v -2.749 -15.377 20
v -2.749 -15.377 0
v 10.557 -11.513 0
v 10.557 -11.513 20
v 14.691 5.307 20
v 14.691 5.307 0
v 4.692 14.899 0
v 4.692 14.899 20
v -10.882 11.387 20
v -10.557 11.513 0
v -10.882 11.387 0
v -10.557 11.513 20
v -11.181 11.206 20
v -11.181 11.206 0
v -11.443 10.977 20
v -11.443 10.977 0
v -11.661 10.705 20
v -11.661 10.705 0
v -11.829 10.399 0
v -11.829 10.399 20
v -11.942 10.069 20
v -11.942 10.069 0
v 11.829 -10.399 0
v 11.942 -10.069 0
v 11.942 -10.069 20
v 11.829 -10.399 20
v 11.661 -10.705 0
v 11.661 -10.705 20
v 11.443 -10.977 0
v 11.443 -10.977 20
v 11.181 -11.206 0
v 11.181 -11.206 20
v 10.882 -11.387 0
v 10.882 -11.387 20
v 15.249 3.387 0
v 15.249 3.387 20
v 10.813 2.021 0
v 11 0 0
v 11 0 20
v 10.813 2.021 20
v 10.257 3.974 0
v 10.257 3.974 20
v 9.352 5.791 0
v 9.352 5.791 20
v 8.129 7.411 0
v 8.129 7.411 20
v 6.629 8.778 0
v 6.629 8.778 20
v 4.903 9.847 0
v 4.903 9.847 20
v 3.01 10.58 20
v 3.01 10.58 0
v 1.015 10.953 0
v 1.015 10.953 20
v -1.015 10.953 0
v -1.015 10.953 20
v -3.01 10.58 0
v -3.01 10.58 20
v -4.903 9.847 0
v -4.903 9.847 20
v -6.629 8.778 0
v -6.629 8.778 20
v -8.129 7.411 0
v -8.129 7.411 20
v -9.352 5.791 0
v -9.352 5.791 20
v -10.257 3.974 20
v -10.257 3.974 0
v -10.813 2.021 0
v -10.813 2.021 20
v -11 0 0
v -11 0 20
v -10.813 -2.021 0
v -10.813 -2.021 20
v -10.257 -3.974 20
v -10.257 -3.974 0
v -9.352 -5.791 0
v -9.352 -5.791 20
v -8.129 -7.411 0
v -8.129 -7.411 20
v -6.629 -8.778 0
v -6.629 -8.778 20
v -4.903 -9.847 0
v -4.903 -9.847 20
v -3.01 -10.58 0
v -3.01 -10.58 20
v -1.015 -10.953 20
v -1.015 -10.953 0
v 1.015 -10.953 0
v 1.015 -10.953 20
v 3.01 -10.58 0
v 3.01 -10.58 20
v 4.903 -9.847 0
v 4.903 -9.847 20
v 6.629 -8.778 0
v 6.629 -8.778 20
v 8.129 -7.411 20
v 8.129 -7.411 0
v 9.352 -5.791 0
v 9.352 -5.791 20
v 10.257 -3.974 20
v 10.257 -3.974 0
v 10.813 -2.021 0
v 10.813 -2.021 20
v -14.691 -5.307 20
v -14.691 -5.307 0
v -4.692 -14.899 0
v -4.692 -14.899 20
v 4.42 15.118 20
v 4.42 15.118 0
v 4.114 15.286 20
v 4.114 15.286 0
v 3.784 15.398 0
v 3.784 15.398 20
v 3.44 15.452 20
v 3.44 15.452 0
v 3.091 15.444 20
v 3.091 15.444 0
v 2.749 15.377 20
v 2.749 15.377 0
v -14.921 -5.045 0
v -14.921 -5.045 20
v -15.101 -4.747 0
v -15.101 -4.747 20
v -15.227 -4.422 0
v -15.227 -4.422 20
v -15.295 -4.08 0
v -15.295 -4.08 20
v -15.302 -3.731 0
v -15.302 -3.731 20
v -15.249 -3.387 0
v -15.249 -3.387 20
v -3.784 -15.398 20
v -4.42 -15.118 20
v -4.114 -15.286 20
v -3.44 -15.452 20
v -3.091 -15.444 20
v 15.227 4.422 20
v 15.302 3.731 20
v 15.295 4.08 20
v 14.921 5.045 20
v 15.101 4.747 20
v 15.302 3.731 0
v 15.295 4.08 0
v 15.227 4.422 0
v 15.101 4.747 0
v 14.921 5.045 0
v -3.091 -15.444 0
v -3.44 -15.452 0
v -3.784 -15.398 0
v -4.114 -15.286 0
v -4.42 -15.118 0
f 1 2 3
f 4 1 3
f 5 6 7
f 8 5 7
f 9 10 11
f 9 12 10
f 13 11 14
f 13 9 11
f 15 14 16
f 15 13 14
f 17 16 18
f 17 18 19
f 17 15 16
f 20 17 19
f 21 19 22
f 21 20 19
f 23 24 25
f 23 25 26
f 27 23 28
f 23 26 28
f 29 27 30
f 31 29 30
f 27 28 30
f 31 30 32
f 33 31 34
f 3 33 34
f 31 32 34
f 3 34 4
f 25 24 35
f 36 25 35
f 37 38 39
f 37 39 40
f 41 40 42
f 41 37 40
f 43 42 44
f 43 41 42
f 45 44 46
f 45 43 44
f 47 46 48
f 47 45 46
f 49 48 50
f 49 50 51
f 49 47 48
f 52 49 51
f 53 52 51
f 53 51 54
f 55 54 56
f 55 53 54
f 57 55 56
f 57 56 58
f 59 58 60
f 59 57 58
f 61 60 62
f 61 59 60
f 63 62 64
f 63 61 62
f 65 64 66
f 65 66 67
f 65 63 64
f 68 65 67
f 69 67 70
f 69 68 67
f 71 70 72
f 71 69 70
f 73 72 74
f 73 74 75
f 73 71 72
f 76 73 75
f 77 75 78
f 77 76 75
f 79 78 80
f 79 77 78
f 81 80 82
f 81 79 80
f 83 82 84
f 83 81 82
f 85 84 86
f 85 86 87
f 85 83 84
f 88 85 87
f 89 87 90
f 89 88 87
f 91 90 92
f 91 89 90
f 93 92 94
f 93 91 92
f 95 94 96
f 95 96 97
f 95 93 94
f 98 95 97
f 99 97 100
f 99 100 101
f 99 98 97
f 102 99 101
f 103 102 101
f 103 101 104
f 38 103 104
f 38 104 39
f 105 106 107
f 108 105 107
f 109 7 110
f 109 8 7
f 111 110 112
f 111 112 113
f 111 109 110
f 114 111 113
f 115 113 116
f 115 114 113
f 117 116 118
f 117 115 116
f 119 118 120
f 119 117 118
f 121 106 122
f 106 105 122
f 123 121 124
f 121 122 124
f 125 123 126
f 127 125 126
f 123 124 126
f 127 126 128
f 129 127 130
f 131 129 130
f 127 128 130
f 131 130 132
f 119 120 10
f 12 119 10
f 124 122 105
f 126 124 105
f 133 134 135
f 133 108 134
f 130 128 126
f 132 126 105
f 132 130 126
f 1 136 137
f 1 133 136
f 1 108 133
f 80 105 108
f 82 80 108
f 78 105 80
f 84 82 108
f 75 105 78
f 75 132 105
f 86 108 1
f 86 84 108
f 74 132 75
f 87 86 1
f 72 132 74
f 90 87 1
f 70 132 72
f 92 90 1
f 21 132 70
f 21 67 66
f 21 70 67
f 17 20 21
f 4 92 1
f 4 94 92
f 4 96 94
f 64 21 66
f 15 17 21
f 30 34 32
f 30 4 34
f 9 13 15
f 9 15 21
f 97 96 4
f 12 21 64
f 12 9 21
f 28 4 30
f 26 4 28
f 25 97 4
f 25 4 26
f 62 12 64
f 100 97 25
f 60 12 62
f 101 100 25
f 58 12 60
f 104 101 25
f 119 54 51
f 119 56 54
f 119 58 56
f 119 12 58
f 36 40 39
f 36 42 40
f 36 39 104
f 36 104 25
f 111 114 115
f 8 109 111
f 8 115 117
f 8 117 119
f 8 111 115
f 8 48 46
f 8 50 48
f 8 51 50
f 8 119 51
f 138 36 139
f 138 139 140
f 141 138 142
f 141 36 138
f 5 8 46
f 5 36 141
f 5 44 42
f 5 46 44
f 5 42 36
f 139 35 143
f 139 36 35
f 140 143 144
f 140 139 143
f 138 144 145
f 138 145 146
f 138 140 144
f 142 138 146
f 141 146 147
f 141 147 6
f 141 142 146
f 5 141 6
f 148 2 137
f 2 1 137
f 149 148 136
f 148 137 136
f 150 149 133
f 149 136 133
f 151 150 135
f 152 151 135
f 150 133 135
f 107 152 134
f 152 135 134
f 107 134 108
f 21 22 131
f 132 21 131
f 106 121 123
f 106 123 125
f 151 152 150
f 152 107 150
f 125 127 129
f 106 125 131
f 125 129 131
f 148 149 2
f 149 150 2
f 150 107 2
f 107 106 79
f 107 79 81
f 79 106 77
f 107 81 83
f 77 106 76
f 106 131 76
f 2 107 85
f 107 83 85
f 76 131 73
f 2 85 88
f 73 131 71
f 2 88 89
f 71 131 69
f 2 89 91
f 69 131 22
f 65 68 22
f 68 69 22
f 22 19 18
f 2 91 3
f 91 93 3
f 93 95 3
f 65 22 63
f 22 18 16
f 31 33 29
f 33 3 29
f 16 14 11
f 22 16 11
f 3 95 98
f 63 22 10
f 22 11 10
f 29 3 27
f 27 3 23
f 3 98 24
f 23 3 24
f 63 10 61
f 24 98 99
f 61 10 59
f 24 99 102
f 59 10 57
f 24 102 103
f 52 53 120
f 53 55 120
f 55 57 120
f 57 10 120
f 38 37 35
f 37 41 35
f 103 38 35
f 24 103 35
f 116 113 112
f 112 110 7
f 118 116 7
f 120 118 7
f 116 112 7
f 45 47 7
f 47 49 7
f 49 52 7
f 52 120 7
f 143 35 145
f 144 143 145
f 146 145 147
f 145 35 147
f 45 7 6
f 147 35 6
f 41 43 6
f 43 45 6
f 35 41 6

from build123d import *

# Parameters (mm, degrees)
SKETCH3_R           = 11
BOSS_EXTRUDE1_DEPTH = 20
FILLET1_R           = 2


with BuildPart() as part:
    # Sketch3 → Boss-Extrude1 (new body)
    with BuildSketch(Plane.XY):
        Polygon((11.666242226, -11.190716048), (15.524565497, 4.50790411), (3.858323271, 15.698620158), (-11.666242226, 11.190716048), (-15.524565497, -4.50790411), (-3.858323271, -15.698620158), align=None)
        Circle(SKETCH3_R, mode=Mode.SUBTRACT)
    extrude(amount=BOSS_EXTRUDE1_DEPTH)

    # Fillet1
    fillet1_edges = [part.edges().sort_by_distance(p)[0] for p in [
        (-3.858323271, -15.698620158, 10),
        (-15.524565497, -4.50790411, 10),
        (-11.666242226, 11.190716048, 10),
        (3.858323271, 15.698620158, 10),
        (15.524565497, 4.50790411, 10),
        (11.666242226, -11.190716048, 10),
    ]]
    fillet(fillet1_edges, radius=FILLET1_R)


solid = part.part
